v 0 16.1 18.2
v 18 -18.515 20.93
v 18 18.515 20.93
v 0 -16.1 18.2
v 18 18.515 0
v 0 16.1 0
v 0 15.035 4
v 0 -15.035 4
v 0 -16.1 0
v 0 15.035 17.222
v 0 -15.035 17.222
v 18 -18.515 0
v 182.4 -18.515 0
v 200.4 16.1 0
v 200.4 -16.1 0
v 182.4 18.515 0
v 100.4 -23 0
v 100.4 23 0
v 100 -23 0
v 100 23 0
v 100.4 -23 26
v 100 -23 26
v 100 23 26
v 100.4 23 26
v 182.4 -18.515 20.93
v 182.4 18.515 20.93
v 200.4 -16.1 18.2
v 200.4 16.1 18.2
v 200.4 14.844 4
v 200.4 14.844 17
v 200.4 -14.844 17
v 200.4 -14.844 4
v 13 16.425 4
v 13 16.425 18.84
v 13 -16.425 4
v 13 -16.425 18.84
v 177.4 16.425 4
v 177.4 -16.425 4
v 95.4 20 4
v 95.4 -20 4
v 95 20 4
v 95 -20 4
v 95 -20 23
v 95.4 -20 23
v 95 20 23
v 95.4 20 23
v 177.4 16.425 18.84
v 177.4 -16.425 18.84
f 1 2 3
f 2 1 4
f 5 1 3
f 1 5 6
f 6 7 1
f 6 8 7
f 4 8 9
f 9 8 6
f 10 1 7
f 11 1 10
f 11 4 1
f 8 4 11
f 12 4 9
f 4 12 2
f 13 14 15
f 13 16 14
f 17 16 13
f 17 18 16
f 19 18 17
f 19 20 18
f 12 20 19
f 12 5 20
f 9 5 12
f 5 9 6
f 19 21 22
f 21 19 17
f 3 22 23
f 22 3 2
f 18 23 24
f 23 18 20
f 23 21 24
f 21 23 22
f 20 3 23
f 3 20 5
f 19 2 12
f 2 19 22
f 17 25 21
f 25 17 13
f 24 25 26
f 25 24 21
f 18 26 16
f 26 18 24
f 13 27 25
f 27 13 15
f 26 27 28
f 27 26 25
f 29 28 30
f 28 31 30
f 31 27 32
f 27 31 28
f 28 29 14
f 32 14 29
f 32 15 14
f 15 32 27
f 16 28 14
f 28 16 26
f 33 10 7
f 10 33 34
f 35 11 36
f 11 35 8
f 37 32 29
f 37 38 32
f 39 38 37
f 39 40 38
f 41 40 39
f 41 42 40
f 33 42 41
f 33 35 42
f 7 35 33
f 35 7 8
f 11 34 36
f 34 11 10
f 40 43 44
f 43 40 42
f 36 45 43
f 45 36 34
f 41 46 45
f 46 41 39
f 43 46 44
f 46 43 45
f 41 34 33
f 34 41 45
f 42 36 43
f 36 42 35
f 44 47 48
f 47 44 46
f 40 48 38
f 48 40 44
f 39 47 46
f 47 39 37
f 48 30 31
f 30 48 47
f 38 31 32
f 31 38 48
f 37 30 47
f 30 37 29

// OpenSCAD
$fn = 32;

// ----------------------------------------------------------------------
// Faired channel: 200 x 46 x 26 mm, 3 mm walls, faired ends
// ----------------------------------------------------------------------

// --- parameters (mm) ---
length = 200;             // channel length
width = 46;               // channel width at mid length
height = 26;              // channel height at mid length
wall = 3;                 // side wall thickness
floor_t = 4;              // floor thickness
end_w = 32.2;             // faired end width
end_h = 18.2;             // faired end height

difference() {
  union() {
    hull() {
      translate([0, -16.1, 0]) cube([0.4, 32.2, 18.2]);
      translate([18, -18.515, 0]) cube([0.4, 37.03, 20.93]);
    }
    hull() {
      translate([18, -18.515, 0]) cube([0.4, 37.03, 20.93]);
      translate([100, -23, 0]) cube([0.4, 46, 26]);
    }
    hull() {
      translate([100, -23, 0]) cube([0.4, 46, 26]);
      translate([182, -18.515, 0]) cube([0.4, 37.03, 20.93]);
    }
    hull() {
      translate([182, -18.515, 0]) cube([0.4, 37.03, 20.93]);
      translate([200, -16.1, 0]) cube([0.4, 32.2, 18.2]);
    }
  }
  /* cavity, 5 mm proud of both ends so the ports are cut clean */
  hull() {
    translate([-5, -14.5, 4]) cube([0.4, 29, 12.6]);
    translate([13, -16.425, 4]) cube([0.4, 32.85, 14.84]);
  }
  hull() {
    translate([13, -16.425, 4]) cube([0.4, 32.85, 14.84]);
    translate([95, -20, 4]) cube([0.4, 40, 19]);
  }
  hull() {
    translate([95, -20, 4]) cube([0.4, 40, 19]);
    translate([177, -16.425, 4]) cube([0.4, 32.85, 14.84]);
  }
  hull() {
    translate([177, -16.425, 4]) cube([0.4, 32.85, 14.84]);
    translate([205, -14.5, 4]) cube([0.4, 29, 12.6]);
  }
}
